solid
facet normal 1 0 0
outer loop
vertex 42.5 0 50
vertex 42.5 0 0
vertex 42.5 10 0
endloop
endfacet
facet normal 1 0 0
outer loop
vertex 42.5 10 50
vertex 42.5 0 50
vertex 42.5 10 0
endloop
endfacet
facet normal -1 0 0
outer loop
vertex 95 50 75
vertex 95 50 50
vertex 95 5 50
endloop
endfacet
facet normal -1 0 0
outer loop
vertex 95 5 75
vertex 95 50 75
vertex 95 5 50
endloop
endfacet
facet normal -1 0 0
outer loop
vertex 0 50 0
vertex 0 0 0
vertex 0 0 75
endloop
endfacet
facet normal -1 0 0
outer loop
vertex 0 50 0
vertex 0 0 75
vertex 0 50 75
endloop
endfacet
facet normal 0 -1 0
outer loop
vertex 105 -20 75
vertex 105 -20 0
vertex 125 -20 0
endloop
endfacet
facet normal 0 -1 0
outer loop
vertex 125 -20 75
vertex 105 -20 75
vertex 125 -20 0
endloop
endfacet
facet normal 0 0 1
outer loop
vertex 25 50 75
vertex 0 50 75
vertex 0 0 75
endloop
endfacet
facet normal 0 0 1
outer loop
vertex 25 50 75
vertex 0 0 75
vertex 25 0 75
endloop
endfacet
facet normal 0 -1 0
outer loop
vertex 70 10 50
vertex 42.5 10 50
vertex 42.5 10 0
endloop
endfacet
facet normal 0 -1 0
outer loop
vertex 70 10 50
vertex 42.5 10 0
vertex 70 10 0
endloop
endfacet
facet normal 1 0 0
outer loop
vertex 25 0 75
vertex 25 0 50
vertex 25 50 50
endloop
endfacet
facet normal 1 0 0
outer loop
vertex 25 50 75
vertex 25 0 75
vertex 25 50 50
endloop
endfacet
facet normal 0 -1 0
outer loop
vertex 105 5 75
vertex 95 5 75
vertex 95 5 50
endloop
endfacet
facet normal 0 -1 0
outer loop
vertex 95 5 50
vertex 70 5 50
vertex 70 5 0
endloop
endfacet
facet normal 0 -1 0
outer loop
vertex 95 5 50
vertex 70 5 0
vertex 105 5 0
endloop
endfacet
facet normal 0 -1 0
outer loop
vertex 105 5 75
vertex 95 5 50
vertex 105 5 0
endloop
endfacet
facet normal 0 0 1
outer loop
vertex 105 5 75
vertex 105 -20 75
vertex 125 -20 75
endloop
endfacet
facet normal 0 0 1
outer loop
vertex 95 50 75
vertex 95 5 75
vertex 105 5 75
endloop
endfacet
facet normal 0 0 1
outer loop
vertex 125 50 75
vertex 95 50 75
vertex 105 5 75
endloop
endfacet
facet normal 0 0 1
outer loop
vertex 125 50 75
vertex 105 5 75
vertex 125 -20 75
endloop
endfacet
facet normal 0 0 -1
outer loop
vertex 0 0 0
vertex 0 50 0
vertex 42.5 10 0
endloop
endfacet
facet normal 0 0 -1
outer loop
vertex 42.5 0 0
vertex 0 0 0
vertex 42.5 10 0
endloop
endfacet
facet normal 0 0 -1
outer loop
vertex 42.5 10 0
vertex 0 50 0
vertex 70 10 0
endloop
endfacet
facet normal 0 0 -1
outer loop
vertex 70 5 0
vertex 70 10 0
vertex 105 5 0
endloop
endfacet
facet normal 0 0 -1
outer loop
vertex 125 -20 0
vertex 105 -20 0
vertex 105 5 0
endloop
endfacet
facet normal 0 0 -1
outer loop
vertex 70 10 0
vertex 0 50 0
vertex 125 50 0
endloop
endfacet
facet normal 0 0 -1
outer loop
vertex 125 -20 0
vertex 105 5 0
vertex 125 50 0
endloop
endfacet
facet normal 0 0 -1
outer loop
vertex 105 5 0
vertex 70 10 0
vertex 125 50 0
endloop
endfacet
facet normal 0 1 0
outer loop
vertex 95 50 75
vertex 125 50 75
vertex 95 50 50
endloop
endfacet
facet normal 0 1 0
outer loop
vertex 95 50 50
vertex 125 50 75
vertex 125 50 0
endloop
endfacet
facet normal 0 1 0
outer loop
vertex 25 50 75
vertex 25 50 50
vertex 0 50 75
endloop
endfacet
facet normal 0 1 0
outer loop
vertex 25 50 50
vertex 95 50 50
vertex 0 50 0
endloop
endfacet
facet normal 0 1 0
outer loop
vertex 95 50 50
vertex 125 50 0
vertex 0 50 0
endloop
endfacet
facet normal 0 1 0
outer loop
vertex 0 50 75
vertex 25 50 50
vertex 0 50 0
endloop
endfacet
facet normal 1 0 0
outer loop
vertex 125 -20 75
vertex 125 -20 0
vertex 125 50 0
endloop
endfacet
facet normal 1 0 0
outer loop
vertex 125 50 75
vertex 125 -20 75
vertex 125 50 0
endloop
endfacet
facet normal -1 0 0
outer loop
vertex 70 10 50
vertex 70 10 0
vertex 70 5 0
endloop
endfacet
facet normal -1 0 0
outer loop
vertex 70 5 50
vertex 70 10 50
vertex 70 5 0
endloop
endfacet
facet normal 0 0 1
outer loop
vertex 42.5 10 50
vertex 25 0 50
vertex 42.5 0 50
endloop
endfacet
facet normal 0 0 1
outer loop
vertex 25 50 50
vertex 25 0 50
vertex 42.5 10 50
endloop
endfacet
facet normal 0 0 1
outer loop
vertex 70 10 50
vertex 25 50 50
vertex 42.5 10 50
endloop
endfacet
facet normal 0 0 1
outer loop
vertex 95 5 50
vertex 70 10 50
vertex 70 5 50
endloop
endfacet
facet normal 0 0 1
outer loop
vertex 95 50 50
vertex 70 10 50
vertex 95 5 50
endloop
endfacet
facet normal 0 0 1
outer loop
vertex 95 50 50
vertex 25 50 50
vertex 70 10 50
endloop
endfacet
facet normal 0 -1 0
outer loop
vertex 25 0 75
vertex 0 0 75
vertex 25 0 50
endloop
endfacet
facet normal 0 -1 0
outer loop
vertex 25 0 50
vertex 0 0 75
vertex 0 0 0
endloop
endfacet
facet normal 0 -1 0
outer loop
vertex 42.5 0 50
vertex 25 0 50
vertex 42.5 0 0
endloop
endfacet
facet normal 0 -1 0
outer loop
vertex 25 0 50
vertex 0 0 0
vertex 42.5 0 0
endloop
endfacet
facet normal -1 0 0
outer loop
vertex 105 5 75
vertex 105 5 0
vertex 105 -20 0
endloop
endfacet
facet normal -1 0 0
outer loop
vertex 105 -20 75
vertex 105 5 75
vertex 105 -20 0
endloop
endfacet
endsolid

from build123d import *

# Parameters (mm, degrees)
F0_W     = 25
F0_H     = 50
F1_DEPTH = 75
F2_DEPTH = 50
F3_DEPTH = 75


with BuildPart() as f1:
    # F0 (on Top) → F1 (new body)
    with BuildSketch(Plane.XY):
        with Locations((12.5, 25)):
            Rectangle(F0_W, F0_H)
    extrude(amount=F1_DEPTH)

    # F0 (on Top) → F2 (join)
    with BuildSketch(Plane.XY):
        Polygon((25, 50), (25, 0), (42.5, 0), (42.5, 10), (70, 10), (70, 5), (95, 5), (95, 50), (70, 50), (42.5, 50), align=None)
    extrude(amount=F2_DEPTH)

    # F0 (on Top) → F3 (join)
    with BuildSketch(Plane.XY):
        Polygon((125, 50), (95, 50), (95, 5), (105, 5), (105, -20), (125, -20), (125, 5), align=None)
    extrude(amount=F3_DEPTH)


solid = f1.part
